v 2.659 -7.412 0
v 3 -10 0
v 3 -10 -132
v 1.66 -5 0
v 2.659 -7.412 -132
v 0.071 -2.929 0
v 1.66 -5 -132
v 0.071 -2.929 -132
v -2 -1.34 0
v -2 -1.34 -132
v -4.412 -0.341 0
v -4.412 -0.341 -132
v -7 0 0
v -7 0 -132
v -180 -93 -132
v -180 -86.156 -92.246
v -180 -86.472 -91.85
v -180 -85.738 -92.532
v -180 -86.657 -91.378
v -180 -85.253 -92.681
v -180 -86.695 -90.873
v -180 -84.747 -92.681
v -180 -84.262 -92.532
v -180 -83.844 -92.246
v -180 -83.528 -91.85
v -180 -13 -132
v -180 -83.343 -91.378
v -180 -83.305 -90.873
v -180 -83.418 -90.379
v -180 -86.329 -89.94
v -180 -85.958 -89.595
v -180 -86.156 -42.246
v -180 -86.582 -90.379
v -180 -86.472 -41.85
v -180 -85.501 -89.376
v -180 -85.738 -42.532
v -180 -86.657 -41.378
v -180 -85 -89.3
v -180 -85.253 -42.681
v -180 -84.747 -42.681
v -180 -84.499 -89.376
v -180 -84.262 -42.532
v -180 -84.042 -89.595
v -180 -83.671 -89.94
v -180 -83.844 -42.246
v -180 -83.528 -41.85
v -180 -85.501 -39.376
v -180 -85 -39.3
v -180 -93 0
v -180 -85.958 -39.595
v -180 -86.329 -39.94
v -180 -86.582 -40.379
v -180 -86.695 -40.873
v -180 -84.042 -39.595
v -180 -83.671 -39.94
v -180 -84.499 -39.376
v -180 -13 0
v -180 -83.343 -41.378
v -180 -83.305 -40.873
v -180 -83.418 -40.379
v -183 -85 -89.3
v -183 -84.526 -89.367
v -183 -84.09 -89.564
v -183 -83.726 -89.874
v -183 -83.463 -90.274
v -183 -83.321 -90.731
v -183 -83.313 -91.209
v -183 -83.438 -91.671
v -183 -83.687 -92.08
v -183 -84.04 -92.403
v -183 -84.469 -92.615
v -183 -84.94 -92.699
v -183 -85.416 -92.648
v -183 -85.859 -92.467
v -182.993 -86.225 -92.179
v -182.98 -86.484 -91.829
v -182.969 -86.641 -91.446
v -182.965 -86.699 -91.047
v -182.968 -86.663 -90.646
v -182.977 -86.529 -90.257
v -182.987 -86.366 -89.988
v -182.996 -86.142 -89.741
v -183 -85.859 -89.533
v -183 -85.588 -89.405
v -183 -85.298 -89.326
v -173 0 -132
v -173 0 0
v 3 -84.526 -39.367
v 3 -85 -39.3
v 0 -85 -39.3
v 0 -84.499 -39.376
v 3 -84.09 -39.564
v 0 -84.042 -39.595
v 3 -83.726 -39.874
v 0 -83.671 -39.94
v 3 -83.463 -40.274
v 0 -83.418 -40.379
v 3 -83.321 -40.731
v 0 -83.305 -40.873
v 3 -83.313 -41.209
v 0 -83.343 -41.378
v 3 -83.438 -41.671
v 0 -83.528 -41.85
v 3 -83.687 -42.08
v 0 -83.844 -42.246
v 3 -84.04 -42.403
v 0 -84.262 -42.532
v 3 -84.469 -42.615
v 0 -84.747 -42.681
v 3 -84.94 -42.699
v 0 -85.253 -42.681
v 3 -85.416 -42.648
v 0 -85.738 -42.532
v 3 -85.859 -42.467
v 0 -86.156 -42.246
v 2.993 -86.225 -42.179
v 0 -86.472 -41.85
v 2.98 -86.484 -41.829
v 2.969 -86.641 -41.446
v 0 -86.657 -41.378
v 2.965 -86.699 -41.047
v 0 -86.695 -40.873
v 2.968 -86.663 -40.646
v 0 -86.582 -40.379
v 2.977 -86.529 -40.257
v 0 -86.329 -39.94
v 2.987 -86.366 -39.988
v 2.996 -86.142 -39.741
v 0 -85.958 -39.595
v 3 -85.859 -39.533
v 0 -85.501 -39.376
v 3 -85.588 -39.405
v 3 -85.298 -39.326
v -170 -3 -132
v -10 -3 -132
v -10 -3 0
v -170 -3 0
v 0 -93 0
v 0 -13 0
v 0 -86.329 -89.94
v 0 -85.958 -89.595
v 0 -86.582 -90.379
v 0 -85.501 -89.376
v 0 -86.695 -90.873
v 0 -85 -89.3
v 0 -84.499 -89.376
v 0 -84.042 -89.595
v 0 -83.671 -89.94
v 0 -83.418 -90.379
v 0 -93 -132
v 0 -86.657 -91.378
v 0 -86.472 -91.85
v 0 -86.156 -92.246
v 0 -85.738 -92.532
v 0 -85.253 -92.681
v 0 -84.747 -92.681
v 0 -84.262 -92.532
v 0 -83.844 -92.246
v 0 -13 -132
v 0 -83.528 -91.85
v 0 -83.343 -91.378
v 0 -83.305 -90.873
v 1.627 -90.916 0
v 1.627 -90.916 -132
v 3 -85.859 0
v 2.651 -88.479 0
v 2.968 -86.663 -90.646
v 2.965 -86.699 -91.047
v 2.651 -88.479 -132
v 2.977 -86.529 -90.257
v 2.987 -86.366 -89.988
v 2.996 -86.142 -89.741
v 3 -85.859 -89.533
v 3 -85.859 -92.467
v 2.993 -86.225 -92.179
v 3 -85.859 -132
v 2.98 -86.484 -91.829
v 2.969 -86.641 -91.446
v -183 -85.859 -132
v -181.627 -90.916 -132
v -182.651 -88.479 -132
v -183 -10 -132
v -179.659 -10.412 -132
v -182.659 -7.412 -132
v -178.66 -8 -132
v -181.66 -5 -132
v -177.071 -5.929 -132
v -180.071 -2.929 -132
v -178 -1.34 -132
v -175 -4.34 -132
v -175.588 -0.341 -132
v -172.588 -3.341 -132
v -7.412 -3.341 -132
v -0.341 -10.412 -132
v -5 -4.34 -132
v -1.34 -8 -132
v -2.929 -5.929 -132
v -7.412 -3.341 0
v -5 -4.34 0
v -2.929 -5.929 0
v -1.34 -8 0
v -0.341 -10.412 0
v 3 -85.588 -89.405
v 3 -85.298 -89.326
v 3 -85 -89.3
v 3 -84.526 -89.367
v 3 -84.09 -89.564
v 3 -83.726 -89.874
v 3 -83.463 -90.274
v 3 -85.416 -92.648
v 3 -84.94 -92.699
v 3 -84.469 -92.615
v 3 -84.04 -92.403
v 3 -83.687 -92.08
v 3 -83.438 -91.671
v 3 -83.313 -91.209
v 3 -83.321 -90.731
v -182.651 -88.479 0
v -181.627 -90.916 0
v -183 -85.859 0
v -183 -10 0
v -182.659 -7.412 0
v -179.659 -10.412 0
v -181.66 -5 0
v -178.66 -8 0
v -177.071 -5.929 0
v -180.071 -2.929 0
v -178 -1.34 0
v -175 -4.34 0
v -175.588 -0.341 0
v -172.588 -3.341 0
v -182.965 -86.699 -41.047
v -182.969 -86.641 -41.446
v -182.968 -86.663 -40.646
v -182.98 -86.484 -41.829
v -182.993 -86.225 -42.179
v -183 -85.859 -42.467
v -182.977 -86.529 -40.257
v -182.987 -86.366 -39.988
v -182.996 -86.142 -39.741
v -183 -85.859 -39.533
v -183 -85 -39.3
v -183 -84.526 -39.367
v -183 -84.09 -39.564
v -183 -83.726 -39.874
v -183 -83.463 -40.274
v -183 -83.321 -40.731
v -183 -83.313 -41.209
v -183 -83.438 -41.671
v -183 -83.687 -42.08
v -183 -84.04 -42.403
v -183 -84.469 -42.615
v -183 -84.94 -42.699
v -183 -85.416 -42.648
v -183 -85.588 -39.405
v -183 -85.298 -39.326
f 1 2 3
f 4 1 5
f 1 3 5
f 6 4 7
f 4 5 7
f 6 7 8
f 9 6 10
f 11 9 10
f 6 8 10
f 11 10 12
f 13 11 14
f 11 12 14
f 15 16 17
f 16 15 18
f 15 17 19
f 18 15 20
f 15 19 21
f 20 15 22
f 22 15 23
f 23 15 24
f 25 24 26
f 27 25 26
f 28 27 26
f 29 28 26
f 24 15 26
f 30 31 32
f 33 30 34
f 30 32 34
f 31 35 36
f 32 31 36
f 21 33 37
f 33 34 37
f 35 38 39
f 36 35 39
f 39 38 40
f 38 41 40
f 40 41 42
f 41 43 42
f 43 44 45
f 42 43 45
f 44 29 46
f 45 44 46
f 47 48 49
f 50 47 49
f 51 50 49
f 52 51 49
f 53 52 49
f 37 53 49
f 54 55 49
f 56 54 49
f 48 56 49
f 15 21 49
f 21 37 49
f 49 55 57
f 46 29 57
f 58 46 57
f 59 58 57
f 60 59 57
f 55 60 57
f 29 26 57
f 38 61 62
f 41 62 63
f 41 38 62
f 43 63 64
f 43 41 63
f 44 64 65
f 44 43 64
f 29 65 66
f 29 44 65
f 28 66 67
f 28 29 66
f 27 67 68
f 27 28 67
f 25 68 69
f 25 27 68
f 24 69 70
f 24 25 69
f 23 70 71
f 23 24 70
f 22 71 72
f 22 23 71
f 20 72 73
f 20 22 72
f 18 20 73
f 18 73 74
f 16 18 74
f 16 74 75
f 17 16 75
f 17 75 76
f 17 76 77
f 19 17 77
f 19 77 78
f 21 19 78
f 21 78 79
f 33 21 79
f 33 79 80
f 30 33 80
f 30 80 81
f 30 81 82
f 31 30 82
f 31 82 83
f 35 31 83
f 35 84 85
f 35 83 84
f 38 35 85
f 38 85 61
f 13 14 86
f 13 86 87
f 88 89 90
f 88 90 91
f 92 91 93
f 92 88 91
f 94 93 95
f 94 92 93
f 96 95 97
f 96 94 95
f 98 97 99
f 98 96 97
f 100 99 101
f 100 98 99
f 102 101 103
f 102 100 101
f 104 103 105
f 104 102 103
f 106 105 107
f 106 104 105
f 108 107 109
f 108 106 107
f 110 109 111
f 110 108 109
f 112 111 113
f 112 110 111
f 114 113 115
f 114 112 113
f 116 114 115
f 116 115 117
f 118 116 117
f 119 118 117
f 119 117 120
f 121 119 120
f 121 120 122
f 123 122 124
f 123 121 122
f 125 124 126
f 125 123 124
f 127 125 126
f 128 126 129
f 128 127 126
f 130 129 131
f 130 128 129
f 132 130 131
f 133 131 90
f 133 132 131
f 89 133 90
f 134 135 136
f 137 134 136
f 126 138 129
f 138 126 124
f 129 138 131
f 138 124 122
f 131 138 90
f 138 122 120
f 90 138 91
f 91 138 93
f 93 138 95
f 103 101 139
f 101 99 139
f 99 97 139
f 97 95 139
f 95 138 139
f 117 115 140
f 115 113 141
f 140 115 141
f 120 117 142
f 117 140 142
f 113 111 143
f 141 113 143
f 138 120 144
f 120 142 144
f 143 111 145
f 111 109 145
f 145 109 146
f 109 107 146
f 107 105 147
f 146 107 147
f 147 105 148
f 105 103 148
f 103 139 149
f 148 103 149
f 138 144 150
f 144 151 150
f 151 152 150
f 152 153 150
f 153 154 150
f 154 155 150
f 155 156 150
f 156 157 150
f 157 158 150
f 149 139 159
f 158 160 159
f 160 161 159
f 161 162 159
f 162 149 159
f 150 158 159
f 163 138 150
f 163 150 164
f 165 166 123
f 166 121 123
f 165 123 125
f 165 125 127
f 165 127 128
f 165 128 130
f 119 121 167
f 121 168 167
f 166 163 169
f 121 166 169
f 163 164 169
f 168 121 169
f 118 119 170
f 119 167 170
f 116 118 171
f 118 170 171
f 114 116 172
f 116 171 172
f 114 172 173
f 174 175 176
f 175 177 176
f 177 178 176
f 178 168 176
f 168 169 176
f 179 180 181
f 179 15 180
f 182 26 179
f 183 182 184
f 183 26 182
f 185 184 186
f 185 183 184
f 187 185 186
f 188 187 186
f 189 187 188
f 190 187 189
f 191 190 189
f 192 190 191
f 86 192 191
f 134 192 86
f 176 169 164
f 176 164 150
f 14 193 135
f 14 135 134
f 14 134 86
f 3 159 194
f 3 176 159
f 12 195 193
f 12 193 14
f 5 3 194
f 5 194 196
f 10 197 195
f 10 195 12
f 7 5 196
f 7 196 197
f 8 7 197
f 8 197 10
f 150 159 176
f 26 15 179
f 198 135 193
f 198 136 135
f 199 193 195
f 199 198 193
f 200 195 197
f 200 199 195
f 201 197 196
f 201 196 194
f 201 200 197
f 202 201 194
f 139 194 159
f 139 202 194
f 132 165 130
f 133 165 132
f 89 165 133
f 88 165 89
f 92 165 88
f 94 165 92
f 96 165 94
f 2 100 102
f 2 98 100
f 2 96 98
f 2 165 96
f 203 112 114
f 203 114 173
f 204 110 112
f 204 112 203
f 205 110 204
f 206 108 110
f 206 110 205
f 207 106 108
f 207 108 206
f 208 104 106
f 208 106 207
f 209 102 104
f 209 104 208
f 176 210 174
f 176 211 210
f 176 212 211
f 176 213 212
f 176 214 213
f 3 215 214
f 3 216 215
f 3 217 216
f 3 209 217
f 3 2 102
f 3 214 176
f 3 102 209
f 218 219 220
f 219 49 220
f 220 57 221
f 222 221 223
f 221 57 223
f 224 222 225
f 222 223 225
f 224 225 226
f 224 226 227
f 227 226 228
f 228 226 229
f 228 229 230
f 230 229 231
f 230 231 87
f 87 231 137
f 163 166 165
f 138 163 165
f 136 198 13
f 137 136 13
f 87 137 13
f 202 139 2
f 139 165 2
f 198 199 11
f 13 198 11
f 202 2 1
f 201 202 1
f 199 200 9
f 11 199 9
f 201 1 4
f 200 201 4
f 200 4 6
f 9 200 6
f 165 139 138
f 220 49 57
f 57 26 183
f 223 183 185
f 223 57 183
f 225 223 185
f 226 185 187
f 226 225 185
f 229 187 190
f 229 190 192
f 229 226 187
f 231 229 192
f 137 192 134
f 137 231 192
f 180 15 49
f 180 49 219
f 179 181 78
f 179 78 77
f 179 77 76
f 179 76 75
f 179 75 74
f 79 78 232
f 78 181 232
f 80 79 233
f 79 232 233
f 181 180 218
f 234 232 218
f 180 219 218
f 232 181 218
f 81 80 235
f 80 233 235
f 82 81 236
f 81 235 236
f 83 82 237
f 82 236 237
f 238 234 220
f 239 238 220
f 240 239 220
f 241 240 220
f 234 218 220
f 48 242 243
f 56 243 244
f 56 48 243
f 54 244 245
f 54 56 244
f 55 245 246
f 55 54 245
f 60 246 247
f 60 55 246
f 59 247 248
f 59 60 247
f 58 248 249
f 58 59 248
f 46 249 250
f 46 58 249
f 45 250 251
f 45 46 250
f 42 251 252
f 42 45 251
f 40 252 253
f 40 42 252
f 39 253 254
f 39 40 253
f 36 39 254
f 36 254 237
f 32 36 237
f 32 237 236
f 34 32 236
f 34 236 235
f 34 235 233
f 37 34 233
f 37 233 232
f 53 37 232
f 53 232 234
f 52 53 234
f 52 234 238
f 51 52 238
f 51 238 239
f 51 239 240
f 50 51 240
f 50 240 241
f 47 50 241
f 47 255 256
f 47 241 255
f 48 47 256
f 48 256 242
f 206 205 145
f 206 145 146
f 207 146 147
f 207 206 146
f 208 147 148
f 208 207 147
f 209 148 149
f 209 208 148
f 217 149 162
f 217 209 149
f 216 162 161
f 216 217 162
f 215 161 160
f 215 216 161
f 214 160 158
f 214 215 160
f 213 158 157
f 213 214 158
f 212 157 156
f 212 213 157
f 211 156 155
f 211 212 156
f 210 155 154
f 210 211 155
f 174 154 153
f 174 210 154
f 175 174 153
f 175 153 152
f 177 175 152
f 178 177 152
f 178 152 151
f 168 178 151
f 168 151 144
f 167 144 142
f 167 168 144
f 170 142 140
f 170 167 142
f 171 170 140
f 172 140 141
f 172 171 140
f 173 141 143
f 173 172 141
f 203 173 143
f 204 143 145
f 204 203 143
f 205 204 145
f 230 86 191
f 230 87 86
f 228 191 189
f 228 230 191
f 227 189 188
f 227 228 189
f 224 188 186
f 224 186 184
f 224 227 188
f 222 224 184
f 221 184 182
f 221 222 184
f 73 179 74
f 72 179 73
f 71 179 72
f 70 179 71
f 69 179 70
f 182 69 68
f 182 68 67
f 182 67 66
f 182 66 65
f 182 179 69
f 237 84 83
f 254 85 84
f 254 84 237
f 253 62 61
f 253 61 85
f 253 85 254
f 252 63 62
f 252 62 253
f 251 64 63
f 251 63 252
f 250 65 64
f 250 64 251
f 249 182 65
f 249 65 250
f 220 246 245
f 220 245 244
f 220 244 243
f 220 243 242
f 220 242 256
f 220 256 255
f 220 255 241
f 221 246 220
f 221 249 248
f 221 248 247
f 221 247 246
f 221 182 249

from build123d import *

# Parameters (mm, degrees)
SKETCH1_W               = 132
SKETCH1_H               = 93
BOSS_EXTRUDE1_DEPTH     = 3
SKETCH3_W               = 132
SKETCH3_H               = 3
BOSS_EXTRUDE2_DEPTH     = 180
BOSS_EXTRUDE3_START     = 180
SKETCH4_W               = 132
SKETCH4_H               = 93
BOSS_EXTRUDE3_DEPTH     = 3
FILLET1_R               = 10
FILLET2_R               = 10
CUT_EXTRUDE1_DEPTH      = 245.053272873
CUT_EXTRUDE1_DEPTH_BACK = 245.053272873
SKETCH5_R               = 1.7


with BuildPart() as part:
    # Sketch1 → Boss-Extrude1 (new body)
    with BuildSketch(Plane(origin=(0, 0, 0), x_dir=(0, 0, -1), z_dir=(1, 0, 0))):
        with Locations((66, -46.5)):
            Rectangle(SKETCH1_W, SKETCH1_H)
    extrude(amount=BOSS_EXTRUDE1_DEPTH)

    # Sketch3 → Boss-Extrude2 (add)
    with BuildSketch(Plane.ZY):
        with Locations((-66, -1.5)):
            Rectangle(SKETCH3_W, SKETCH3_H)
    extrude(amount=BOSS_EXTRUDE2_DEPTH)

    # Sketch4 → Boss-Extrude3 (add)
    with BuildSketch(Plane.ZY.offset(BOSS_EXTRUDE3_START)):
        with Locations((-66, -46.5)):
            Rectangle(SKETCH4_W, SKETCH4_H)
    extrude(amount=BOSS_EXTRUDE3_DEPTH)

    # Fillet1
    fillet1_edges = [part.edges().sort_by_distance(p)[0] for p in [
        (0, -3, -66),
        (3, 0, -66),
        (-180, -3, -66),
        (-183, 0, -66),
    ]]
    fillet(fillet1_edges, radius=FILLET1_R)

    # Fillet2
    # the kernel refuses this fillet: 10 mm, written as the material it takes off along each edge
    with BuildSketch(Plane(origin=(3, -93, -149.853571071), x_dir=(0, 1, 0), z_dir=(0, 0, 1)), Plane(origin=(-183, -93, 17.853571071), x_dir=(0, 1, 0), z_dir=(0, 0, -1))) as fillet2_piece_1:
        with BuildLine():
            CenterArc((7.141428429, 10), FILLET2_R, 224.427004001, 45.572995999)
            Line((0, 3), (-0.142828569, 2.86))
            ThreePointArc((-0.142828569, 2.86), (-0.2, 1.5), (-0.2, 0))
            Line((-0.2, 0), (0, -0.2))
            Line((0, -0.2), (7.141428429, -0.2))
            Line((7.141428429, -0.2), (7.141428429, 0))
        make_face()
    extrude(amount=167.707142143, mode=Mode.SUBTRACT)

    # Sketch5 → Cut-Extrude1 (cut, two sides: drawn at the far end of the back side and taken through both)
    with BuildSketch(Plane.ZY.offset(-CUT_EXTRUDE1_DEPTH_BACK)):
        with Locations((-91, -85)):
            Circle(SKETCH5_R)
        with Locations((-41, -85)):
            Circle(SKETCH5_R)
    extrude(amount=CUT_EXTRUDE1_DEPTH + CUT_EXTRUDE1_DEPTH_BACK, mode=Mode.SUBTRACT)


solid = part.part
